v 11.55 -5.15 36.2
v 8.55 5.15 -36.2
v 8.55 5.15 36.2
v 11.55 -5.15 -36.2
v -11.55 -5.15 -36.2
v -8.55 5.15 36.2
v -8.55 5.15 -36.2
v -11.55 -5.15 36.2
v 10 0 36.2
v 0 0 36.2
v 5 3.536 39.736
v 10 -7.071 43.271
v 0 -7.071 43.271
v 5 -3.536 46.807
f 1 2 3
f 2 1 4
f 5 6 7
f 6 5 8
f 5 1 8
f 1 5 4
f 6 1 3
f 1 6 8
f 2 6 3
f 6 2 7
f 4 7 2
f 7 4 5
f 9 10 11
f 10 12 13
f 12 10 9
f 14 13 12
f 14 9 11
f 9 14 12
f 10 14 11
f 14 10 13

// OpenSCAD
module tapered_arm() {
    // Main tapered arm
    translate([-11.55, -5.15, -36.2])
    linear_extrude(height=72.4, scale=1.0)
    polygon(points=[[0, 0], [23.1, 0], [20.1, 10.3], [3.0, 10.3]]);
}

module triangular_fin() {
    // Triangular fin attached at an angle
    translate([0, 0, 36.2])
    rotate([45, 0, 0])
    linear_extrude(height=10)
    polygon(points=[[0, 0], [10, 0], [5, 5]]);
}

tapered_arm();
triangular_fin();
